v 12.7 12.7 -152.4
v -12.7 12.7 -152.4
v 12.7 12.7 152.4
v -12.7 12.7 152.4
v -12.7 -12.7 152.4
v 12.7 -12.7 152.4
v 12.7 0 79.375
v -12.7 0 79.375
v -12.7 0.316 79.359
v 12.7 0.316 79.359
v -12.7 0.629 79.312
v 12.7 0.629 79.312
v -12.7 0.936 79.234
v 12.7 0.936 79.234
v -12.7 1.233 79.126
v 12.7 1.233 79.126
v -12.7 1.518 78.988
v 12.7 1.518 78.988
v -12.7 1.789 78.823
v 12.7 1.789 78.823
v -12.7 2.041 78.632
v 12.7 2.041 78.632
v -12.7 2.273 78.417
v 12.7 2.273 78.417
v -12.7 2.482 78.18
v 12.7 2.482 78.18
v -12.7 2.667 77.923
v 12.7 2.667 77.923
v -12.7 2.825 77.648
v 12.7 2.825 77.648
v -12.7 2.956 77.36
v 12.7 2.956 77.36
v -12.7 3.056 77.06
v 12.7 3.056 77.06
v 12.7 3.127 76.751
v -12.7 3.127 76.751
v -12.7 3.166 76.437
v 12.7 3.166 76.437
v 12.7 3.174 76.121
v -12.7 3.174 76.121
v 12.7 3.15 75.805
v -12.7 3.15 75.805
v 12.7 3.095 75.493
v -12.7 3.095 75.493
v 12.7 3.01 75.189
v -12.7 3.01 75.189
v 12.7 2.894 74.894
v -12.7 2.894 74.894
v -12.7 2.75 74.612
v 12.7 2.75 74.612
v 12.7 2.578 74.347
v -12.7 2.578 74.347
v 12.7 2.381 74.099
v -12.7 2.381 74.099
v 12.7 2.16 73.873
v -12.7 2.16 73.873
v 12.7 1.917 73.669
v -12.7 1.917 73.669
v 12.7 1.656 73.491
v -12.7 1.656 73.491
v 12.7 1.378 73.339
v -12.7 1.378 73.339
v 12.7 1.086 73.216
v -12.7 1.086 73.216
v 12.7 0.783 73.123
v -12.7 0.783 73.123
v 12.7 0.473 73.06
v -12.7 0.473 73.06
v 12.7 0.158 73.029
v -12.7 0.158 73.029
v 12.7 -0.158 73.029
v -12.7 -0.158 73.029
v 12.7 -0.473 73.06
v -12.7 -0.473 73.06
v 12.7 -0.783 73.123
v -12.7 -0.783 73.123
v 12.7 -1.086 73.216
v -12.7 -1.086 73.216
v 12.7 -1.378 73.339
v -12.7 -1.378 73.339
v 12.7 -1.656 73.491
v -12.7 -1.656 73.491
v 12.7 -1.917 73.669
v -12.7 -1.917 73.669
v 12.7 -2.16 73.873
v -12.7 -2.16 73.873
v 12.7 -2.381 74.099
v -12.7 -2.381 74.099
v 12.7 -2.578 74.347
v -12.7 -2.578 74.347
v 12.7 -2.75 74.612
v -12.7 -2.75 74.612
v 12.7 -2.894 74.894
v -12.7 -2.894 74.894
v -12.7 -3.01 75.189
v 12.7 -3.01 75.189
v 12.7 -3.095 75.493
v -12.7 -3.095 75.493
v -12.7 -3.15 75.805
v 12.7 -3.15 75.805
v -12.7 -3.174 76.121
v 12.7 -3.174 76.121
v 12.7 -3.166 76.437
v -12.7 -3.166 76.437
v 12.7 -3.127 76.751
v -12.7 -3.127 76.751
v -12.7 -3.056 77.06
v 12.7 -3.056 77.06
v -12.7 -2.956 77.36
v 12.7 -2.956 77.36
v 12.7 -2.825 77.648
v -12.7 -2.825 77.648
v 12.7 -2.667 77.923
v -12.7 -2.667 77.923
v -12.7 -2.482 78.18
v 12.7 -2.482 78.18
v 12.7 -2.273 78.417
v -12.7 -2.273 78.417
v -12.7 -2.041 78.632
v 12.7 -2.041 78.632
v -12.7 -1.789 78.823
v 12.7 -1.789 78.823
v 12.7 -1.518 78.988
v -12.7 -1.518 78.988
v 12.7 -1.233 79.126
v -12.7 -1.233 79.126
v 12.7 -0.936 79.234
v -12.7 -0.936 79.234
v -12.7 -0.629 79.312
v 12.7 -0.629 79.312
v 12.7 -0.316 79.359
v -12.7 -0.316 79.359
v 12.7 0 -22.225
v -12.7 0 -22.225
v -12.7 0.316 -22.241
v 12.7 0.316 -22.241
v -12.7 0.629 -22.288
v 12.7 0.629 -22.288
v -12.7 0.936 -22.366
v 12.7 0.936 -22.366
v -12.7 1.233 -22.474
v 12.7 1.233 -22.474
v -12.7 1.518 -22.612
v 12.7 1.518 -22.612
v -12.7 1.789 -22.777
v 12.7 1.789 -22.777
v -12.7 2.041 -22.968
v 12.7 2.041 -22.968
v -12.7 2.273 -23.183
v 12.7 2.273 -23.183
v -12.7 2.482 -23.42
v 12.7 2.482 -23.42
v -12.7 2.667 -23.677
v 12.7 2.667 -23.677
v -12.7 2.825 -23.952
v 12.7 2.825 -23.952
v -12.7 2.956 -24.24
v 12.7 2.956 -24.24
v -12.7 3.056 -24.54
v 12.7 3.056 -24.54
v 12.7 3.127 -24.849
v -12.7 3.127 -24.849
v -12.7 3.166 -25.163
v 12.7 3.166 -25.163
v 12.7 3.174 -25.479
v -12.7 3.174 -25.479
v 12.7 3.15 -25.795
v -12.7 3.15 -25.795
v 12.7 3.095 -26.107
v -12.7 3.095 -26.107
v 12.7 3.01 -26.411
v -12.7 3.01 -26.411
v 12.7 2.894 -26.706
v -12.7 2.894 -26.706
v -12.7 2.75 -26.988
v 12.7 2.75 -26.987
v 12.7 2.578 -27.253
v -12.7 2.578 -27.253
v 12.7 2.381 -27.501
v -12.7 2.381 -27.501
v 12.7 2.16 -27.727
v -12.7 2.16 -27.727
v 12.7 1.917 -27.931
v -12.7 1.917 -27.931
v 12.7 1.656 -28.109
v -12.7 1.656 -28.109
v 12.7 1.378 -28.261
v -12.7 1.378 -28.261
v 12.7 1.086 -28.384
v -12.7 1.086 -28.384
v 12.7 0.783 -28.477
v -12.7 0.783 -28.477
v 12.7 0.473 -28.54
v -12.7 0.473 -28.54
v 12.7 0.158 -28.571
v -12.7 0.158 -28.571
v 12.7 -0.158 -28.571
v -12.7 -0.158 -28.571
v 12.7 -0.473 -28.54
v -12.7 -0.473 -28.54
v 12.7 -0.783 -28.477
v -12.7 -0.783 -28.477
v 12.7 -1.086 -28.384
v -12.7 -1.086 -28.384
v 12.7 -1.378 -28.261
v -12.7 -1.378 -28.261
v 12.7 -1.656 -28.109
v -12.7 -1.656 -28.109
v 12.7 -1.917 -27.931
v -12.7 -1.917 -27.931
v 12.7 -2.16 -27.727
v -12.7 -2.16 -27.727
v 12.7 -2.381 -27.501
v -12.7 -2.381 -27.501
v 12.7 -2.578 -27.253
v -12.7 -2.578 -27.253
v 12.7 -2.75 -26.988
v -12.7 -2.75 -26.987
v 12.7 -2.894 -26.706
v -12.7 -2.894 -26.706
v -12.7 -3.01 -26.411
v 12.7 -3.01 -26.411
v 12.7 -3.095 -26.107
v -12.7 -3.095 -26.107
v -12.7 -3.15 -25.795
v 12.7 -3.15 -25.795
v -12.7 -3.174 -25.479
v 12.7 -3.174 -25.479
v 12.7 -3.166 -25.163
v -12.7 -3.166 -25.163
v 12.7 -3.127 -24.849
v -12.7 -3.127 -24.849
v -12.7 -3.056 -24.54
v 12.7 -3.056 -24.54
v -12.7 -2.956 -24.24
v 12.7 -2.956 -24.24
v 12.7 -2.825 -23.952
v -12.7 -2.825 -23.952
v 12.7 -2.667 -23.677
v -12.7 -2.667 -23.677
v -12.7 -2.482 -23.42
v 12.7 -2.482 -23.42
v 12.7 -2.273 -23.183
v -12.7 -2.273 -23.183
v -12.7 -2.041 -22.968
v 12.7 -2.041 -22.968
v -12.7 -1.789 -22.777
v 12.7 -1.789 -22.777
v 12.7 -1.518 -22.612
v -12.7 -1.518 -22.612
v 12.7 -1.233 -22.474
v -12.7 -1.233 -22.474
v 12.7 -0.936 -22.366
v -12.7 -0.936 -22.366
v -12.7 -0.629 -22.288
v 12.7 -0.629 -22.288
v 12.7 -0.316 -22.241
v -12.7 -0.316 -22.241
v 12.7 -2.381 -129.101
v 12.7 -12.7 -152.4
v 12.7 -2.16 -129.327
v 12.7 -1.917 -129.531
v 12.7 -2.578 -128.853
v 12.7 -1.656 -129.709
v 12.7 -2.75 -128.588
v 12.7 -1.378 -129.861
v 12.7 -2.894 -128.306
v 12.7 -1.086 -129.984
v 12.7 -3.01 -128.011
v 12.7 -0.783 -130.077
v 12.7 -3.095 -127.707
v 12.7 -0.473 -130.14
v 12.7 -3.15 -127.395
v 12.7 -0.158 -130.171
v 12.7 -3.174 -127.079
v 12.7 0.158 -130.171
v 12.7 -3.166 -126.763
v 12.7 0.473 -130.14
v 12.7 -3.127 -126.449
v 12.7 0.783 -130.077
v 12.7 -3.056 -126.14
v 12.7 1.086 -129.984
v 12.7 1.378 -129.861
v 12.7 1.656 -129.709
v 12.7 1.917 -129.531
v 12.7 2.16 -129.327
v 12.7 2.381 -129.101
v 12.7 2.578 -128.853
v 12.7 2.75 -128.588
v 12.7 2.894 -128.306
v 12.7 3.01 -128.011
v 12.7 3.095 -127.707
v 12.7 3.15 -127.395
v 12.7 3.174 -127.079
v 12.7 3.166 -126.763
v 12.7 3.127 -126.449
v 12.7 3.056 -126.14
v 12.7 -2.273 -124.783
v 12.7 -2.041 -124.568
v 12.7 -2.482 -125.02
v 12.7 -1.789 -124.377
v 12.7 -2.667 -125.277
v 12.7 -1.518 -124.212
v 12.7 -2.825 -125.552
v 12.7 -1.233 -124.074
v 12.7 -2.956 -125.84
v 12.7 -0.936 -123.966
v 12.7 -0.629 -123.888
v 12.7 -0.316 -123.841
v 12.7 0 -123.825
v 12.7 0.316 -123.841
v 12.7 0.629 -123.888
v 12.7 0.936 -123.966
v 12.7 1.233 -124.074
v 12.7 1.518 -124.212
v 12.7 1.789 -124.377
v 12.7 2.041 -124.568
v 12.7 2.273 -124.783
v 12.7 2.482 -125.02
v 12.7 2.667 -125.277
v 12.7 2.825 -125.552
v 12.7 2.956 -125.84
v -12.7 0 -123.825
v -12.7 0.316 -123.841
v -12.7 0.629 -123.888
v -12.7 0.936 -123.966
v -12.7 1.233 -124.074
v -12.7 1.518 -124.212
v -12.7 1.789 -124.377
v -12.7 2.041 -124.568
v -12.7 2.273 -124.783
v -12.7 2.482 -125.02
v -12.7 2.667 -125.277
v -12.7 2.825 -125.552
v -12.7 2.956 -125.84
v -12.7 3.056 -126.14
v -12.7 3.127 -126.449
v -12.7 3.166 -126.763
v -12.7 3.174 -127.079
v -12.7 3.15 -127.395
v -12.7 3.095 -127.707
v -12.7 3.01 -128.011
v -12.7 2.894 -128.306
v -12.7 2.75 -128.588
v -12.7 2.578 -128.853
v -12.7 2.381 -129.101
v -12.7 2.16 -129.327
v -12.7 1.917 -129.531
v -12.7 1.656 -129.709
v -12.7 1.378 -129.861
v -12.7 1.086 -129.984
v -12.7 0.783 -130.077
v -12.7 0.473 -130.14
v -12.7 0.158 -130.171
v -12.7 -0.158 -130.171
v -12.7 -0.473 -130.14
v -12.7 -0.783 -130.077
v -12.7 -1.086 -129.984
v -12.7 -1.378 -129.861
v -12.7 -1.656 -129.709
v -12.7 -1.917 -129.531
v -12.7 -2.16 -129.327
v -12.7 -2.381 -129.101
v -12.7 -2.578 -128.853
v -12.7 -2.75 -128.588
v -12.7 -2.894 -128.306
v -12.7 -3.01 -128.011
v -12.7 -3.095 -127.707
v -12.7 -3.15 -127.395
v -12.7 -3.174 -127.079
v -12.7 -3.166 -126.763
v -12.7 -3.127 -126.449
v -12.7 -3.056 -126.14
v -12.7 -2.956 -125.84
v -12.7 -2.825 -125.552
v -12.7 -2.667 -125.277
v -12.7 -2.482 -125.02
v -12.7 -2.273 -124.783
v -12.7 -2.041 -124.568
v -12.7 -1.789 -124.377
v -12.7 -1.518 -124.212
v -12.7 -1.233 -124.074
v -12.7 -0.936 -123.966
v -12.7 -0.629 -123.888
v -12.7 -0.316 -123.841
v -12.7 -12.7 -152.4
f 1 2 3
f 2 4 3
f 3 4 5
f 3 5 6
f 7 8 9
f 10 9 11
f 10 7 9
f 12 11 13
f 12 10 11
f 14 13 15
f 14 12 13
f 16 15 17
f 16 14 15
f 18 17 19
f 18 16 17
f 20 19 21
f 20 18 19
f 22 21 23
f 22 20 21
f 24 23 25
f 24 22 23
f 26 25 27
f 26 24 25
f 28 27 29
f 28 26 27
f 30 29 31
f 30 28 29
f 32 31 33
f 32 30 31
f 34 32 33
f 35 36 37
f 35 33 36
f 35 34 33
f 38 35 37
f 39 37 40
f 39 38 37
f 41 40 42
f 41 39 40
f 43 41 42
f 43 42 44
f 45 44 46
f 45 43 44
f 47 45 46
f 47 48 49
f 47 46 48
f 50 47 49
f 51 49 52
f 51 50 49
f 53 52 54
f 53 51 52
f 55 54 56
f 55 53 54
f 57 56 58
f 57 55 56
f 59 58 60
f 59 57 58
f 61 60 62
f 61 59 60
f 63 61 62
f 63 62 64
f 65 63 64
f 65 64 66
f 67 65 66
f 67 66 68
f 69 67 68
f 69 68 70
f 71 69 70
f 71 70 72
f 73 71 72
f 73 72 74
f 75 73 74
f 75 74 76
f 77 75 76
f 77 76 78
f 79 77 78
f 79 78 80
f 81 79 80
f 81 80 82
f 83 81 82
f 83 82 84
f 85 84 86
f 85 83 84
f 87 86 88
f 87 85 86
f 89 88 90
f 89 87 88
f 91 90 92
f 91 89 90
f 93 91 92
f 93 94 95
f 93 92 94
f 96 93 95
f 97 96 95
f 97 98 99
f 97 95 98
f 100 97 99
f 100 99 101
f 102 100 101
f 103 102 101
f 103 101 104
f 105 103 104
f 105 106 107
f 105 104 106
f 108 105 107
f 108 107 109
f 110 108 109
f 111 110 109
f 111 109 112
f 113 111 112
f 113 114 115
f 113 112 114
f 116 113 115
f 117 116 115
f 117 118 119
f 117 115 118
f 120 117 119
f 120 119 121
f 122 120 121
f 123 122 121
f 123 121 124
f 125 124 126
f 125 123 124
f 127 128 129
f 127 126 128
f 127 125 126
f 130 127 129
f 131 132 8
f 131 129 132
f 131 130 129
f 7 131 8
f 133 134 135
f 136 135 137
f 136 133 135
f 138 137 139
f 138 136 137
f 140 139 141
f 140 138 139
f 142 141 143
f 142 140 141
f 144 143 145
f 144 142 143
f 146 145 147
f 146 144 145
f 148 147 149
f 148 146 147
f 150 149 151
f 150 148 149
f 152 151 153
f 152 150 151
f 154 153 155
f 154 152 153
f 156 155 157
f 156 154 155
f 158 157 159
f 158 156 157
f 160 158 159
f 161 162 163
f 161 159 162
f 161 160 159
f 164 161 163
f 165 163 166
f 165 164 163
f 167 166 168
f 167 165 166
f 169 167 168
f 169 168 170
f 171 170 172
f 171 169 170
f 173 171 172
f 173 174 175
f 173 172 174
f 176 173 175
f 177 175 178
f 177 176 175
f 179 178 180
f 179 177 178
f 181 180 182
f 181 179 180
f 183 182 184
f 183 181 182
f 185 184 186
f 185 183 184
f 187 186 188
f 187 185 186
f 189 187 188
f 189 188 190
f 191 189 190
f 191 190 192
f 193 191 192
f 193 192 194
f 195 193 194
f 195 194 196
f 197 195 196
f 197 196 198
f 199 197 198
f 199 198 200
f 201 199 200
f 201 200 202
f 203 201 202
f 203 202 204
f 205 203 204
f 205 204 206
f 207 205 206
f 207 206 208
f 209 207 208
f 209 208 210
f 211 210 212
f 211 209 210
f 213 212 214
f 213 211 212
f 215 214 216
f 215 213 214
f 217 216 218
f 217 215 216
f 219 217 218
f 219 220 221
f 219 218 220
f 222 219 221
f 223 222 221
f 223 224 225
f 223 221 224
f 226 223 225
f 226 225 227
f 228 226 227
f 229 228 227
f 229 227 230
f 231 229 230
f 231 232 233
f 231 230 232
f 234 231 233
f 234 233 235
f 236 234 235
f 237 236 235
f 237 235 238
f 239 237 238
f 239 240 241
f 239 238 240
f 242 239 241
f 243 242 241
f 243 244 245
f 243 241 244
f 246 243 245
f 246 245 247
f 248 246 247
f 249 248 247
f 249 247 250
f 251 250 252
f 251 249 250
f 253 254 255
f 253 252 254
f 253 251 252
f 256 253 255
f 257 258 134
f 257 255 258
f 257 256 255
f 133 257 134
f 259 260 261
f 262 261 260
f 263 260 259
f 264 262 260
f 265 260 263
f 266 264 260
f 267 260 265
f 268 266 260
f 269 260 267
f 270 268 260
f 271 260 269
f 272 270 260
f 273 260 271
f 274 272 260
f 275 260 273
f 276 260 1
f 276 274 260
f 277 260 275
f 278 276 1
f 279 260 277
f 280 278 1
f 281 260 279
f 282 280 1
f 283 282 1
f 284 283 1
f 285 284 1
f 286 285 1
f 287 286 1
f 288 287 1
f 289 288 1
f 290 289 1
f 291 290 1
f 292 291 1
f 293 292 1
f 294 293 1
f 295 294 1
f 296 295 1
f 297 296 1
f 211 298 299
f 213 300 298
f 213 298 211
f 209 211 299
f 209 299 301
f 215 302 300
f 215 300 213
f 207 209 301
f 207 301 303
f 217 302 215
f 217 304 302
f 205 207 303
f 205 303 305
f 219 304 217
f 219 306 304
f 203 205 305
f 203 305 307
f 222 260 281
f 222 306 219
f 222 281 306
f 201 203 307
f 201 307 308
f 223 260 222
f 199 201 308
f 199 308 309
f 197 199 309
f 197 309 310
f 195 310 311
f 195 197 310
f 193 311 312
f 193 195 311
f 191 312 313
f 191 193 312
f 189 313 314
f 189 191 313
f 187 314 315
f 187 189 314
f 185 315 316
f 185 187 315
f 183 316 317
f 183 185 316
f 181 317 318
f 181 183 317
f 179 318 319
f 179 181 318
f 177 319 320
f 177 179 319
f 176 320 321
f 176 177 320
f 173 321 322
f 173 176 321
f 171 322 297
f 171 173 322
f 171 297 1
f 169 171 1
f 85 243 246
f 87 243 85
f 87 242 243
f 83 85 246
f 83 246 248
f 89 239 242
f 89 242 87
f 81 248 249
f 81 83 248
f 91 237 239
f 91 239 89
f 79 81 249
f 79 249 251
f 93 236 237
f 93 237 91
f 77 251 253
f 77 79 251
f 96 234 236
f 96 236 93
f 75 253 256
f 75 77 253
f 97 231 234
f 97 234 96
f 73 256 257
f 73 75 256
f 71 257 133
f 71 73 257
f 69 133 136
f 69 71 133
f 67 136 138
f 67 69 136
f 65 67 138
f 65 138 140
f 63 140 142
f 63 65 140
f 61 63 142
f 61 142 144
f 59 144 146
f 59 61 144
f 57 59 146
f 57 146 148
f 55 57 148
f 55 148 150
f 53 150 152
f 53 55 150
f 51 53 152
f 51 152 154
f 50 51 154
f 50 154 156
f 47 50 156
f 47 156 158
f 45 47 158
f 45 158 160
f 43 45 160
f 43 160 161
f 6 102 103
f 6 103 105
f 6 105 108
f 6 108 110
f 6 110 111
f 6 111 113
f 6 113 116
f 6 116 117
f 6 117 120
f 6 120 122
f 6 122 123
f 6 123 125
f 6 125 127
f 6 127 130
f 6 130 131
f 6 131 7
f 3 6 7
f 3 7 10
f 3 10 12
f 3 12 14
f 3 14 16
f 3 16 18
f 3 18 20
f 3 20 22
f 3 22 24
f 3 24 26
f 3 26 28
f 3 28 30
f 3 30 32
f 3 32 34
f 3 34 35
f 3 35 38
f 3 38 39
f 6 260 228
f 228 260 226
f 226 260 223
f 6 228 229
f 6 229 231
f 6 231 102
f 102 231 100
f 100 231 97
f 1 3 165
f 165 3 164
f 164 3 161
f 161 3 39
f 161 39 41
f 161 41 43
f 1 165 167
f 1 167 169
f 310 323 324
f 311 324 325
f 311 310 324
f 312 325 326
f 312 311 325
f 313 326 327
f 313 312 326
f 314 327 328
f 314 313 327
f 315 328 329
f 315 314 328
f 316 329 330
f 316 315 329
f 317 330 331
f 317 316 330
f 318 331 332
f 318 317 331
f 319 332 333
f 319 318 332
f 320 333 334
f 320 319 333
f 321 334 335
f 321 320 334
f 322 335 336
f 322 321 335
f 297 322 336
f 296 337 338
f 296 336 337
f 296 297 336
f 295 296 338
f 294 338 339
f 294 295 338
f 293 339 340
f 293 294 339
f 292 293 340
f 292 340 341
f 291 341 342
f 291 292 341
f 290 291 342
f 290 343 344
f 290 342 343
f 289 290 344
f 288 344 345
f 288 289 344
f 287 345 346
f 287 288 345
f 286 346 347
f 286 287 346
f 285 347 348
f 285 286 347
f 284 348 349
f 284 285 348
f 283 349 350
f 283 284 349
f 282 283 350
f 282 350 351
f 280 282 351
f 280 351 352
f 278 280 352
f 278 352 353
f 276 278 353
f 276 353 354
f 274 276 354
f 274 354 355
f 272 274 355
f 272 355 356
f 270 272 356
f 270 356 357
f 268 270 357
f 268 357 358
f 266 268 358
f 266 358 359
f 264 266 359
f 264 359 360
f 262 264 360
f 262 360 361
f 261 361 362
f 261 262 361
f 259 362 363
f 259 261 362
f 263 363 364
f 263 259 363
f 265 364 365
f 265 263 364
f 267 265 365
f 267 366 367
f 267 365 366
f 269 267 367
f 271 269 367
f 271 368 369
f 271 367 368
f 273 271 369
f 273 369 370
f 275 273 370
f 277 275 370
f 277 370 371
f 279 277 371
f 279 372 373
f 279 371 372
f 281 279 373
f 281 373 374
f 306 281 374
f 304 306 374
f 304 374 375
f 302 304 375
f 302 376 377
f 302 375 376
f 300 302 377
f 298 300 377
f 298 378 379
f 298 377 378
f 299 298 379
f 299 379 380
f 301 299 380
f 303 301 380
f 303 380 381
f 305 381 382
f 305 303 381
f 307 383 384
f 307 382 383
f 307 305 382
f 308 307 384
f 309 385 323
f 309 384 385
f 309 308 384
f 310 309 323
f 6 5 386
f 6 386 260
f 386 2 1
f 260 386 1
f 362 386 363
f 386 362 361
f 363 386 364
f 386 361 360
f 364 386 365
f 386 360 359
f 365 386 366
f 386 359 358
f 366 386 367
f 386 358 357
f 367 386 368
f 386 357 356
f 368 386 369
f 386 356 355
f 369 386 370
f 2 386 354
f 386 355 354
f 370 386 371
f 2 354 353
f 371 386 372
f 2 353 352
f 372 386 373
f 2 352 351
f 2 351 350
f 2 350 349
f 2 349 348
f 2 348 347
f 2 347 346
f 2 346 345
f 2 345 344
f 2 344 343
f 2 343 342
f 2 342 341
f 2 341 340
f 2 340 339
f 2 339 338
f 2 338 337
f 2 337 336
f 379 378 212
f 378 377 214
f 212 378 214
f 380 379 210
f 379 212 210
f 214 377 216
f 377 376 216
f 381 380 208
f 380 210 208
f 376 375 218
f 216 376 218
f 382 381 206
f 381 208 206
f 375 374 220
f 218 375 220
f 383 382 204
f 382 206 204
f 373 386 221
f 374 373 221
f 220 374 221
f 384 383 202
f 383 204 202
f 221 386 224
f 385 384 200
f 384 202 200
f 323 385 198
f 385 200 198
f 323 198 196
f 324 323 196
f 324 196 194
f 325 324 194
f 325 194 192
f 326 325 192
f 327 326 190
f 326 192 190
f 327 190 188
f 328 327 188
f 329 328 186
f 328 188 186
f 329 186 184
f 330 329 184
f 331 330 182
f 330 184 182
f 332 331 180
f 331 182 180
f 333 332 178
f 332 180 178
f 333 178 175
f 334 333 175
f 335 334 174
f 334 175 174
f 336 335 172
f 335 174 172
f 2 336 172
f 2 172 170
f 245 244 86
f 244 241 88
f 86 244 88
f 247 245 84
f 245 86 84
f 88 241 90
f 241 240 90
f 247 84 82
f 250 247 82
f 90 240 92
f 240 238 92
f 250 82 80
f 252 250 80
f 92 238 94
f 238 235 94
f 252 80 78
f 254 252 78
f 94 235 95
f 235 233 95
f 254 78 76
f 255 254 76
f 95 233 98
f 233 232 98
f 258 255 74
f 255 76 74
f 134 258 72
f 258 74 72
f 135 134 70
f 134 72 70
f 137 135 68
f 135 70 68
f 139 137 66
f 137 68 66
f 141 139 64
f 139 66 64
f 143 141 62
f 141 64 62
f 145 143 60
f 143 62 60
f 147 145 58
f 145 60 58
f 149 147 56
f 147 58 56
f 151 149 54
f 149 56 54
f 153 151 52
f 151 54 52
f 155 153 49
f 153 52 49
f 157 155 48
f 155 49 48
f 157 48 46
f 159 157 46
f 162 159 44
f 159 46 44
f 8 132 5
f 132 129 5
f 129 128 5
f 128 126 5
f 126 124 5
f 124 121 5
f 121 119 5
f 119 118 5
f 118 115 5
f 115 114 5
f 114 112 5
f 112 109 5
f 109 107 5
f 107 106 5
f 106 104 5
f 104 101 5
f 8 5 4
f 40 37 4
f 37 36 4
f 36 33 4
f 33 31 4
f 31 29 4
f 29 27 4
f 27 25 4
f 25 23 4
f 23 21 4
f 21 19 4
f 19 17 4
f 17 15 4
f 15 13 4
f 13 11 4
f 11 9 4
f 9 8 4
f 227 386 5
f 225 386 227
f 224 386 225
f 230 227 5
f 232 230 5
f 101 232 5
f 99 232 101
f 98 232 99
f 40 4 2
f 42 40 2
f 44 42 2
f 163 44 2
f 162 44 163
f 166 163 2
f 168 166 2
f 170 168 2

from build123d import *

# Parameters (mm, degrees)
SKETCH7_W           = 25.4
SKETCH7_H           = 25.4
BOSS_EXTRUDE3_DEPTH = 152.4
SKETCH9_R           = 3.175
CUT_EXTRUDE1_DEPTH  = 156.02325632
LPATTERN1_COUNT     = 2
LPATTERN1_PITCH     = 101.6
LPATTERN1_COL_COUNT = 2
LPATTERN1_COL_PITCH = 101.6


with BuildPart() as part:
    # Sketch7 → Boss-Extrude3 (new, symmetric)
    with BuildSketch(Plane.XY):
        Rectangle(SKETCH7_W, SKETCH7_H)
    extrude(amount=BOSS_EXTRUDE3_DEPTH, both=True)

    # Sketch9 → Cut-Extrude1 (cut, through all)
    with BuildSketch(Plane(origin=(12.7, 0, 0), x_dir=(0, -1, 0), z_dir=(-1, 0, 0))):
        with Locations(Location((0, -25.4, 0), (0, 0, 90))):
            Circle(SKETCH9_R)
    cut_extrude1 = extrude(amount=CUT_EXTRUDE1_DEPTH, mode=Mode.SUBTRACT)

    # LPattern1: Cut-Extrude1 ×2
    with Locations(*[(0, 0, -i * LPATTERN1_PITCH) for i in range(1, LPATTERN1_COUNT)]):
        add(cut_extrude1, mode=Mode.SUBTRACT)

    # LPattern1 col: Cut-Extrude1 ×2
    with Locations(*[(0, 0, i * LPATTERN1_COL_PITCH) for i in range(1, LPATTERN1_COL_COUNT)]):
        add(cut_extrude1, mode=Mode.SUBTRACT)


solid = part.part
